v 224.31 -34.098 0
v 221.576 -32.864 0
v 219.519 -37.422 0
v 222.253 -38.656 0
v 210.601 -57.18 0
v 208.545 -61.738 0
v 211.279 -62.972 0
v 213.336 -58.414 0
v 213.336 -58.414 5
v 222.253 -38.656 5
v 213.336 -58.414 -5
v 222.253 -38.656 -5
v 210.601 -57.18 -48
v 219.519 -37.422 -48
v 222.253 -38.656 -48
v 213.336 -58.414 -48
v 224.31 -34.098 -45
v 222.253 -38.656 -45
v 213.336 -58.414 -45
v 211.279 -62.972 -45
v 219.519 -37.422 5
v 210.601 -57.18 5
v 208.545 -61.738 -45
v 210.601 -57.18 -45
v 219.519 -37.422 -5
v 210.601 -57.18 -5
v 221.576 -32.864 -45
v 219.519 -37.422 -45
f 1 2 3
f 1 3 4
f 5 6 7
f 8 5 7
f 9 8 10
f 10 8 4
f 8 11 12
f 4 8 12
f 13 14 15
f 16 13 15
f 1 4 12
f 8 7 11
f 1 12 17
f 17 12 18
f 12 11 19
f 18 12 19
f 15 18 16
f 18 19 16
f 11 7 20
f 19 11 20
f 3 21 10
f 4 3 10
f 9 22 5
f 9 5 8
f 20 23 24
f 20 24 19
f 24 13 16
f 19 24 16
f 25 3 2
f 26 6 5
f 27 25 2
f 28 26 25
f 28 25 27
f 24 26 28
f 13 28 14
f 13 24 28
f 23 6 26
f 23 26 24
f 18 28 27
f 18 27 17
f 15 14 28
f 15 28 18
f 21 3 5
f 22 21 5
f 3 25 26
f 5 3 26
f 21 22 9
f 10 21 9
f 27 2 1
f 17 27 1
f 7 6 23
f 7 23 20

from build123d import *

# Parameters (mm, degrees)
ESTRUSIONE_ESTRUSIONE1_DEPTH      = 48
ESTRUSIONE_ESTRUSIONE1_DEPTH_BACK = 5
SCHIZZO2_W                        = 3
SCHIZZO2_H                        = 45
ESTRUSIONE_ESTRUSIONE2_DEPTH      = 5
CORPO_SPOSTA_COPIA1_START         = 29.517316332
CORPO_SPOSTA_COPIA1_OUTLINE_W     = 3
CORPO_SPOSTA_COPIA1_OUTLINE_H     = 43
CORPO_SPOSTA_COPIA1_DEPTH         = 31.678003798
CORPO_SPOSTA_COPIA1_2_OUTLINE_W   = 3
CORPO_SPOSTA_COPIA1_2_OUTLINE_H   = 5
CORPO_SPOSTA_COPIA1_2_DEPTH       = 5
CORPO_SPOSTA_COPIA1_START_2       = 56.19532013
CORPO_SPOSTA_COPIA1_3_OUTLINE_W   = 3
CORPO_SPOSTA_COPIA1_3_OUTLINE_H   = 5
CORPO_SPOSTA_COPIA1_3_DEPTH       = 5
CORPO_SPOSTA_COPIA1_4_OUTLINE_W   = 3
CORPO_SPOSTA_COPIA1_4_OUTLINE_H   = 45
CORPO_SPOSTA_COPIA1_4_DEPTH       = 31.678003798
CORPO_SPOSTA_COPIA1_START_3       = 34.517316332
CORPO_SPOSTA_COPIA1_5_OUTLINE_W   = 3
CORPO_SPOSTA_COPIA1_5_OUTLINE_H   = 3
CORPO_SPOSTA_COPIA1_5_DEPTH       = 21.678003798


# Read off the part's stored shape, not the designer's step: Corpo-Sposta/copia1
with BuildPart() as part:
    # Schizzo1 → Estrusione-Estrusione1 (new, two sides: drawn at the far end of the back side and taken through both)
    with BuildSketch(Plane.XY.offset(-ESTRUSIONE_ESTRUSIONE1_DEPTH_BACK)):
        Polygon((219.519084515, -37.421559693), (210.601374282, -57.180362615), (213.33577775, -58.414476741), (222.253487983, -38.655673819), align=None)
    extrude(amount=ESTRUSIONE_ESTRUSIONE1_DEPTH + ESTRUSIONE_ESTRUSIONE1_DEPTH_BACK)

    # Schizzo2 → Estrusione-Estrusione2 (add)
    with BuildSketch(Plane(origin=(23.117146118, 51.220226082, 0), x_dir=(0.9114678226482943, -0.41137137513052313, 0), z_dir=(0.41137137513052313, 0.9114678226482943, 0))):
        with Locations((216.978740463, -22.5)):
            Rectangle(SCHIZZO2_W, SCHIZZO2_H)
    estrusione_estrusione2 = extrude(amount=ESTRUSIONE_ESTRUSIONE2_DEPTH)

    # Specchia1: Estrusione-Estrusione2 across plane
    add(estrusione_estrusione2.mirror(Plane(origin=(18.658291002, 41.340824621, 0), x_dir=(0, 0, 1), z_dir=(0.41137137513052446, 0.9114678226482937, 0))))

    # Corpo-Sposta/copia1 outline → Corpo-Sposta/copia1 (cut)
    with BuildSketch(Plane(origin=(0, 0, 0), x_dir=(0.9114678226482965, -0.4113713751305183, 0), z_dir=(0.41137137513051825, 0.9114678226482965, 0)).offset(CORPO_SPOSTA_COPIA1_START)):
        with Locations((216.978740463, -26.5)):
            Rectangle(CORPO_SPOSTA_COPIA1_OUTLINE_W, CORPO_SPOSTA_COPIA1_OUTLINE_H)
    extrude(amount=CORPO_SPOSTA_COPIA1_DEPTH, mode=Mode.SUBTRACT)

    # Corpo-Sposta_copia1 2 outline → Corpo-Sposta_copia1 2 (cut)
    with BuildSketch(Plane(origin=(0, 0, 0), x_dir=(0.9114678226482965, -0.4113713751305183, 0), z_dir=(0.41137137513051825, 0.9114678226482965, 0)).offset(CORPO_SPOSTA_COPIA1_START)):
        with Locations((216.978740463, -2.5)):
            Rectangle(CORPO_SPOSTA_COPIA1_2_OUTLINE_W, CORPO_SPOSTA_COPIA1_2_OUTLINE_H)
    extrude(amount=CORPO_SPOSTA_COPIA1_2_DEPTH, mode=Mode.SUBTRACT)

    # Corpo-Sposta_copia1 3 outline → Corpo-Sposta_copia1 3 (cut)
    with BuildSketch(Plane(origin=(0, 0, 0), x_dir=(0.9114678226482965, -0.4113713751305183, 0), z_dir=(0.41137137513051825, 0.9114678226482965, 0)).offset(CORPO_SPOSTA_COPIA1_START_2)):
        with Locations((216.978740463, -2.5)):
            Rectangle(CORPO_SPOSTA_COPIA1_3_OUTLINE_W, CORPO_SPOSTA_COPIA1_3_OUTLINE_H)
    extrude(amount=CORPO_SPOSTA_COPIA1_3_DEPTH, mode=Mode.SUBTRACT)

    # Corpo-Sposta_copia1 4 outline → Corpo-Sposta_copia1 4 (add)
    with BuildSketch(Plane(origin=(0, 0, 0), x_dir=(0.9114678226482965, -0.4113713751305183, 0), z_dir=(0.41137137513051825, 0.9114678226482965, 0)).offset(CORPO_SPOSTA_COPIA1_START)):
        with Locations((216.978740463, 22.5)):
            Rectangle(CORPO_SPOSTA_COPIA1_4_OUTLINE_W, CORPO_SPOSTA_COPIA1_4_OUTLINE_H)
    extrude(amount=CORPO_SPOSTA_COPIA1_4_DEPTH)

    # Corpo-Sposta_copia1 5 outline → Corpo-Sposta_copia1 5 (add)
    with BuildSketch(Plane(origin=(0, 0, 0), x_dir=(0.9114678226482965, -0.4113713751305183, 0), z_dir=(0.41137137513051825, 0.9114678226482965, 0)).offset(CORPO_SPOSTA_COPIA1_START_3)):
        with Locations((216.978740463, 46.5)):
            Rectangle(CORPO_SPOSTA_COPIA1_5_OUTLINE_W, CORPO_SPOSTA_COPIA1_5_OUTLINE_H)
    extrude(amount=CORPO_SPOSTA_COPIA1_5_DEPTH)


solid = part.part
